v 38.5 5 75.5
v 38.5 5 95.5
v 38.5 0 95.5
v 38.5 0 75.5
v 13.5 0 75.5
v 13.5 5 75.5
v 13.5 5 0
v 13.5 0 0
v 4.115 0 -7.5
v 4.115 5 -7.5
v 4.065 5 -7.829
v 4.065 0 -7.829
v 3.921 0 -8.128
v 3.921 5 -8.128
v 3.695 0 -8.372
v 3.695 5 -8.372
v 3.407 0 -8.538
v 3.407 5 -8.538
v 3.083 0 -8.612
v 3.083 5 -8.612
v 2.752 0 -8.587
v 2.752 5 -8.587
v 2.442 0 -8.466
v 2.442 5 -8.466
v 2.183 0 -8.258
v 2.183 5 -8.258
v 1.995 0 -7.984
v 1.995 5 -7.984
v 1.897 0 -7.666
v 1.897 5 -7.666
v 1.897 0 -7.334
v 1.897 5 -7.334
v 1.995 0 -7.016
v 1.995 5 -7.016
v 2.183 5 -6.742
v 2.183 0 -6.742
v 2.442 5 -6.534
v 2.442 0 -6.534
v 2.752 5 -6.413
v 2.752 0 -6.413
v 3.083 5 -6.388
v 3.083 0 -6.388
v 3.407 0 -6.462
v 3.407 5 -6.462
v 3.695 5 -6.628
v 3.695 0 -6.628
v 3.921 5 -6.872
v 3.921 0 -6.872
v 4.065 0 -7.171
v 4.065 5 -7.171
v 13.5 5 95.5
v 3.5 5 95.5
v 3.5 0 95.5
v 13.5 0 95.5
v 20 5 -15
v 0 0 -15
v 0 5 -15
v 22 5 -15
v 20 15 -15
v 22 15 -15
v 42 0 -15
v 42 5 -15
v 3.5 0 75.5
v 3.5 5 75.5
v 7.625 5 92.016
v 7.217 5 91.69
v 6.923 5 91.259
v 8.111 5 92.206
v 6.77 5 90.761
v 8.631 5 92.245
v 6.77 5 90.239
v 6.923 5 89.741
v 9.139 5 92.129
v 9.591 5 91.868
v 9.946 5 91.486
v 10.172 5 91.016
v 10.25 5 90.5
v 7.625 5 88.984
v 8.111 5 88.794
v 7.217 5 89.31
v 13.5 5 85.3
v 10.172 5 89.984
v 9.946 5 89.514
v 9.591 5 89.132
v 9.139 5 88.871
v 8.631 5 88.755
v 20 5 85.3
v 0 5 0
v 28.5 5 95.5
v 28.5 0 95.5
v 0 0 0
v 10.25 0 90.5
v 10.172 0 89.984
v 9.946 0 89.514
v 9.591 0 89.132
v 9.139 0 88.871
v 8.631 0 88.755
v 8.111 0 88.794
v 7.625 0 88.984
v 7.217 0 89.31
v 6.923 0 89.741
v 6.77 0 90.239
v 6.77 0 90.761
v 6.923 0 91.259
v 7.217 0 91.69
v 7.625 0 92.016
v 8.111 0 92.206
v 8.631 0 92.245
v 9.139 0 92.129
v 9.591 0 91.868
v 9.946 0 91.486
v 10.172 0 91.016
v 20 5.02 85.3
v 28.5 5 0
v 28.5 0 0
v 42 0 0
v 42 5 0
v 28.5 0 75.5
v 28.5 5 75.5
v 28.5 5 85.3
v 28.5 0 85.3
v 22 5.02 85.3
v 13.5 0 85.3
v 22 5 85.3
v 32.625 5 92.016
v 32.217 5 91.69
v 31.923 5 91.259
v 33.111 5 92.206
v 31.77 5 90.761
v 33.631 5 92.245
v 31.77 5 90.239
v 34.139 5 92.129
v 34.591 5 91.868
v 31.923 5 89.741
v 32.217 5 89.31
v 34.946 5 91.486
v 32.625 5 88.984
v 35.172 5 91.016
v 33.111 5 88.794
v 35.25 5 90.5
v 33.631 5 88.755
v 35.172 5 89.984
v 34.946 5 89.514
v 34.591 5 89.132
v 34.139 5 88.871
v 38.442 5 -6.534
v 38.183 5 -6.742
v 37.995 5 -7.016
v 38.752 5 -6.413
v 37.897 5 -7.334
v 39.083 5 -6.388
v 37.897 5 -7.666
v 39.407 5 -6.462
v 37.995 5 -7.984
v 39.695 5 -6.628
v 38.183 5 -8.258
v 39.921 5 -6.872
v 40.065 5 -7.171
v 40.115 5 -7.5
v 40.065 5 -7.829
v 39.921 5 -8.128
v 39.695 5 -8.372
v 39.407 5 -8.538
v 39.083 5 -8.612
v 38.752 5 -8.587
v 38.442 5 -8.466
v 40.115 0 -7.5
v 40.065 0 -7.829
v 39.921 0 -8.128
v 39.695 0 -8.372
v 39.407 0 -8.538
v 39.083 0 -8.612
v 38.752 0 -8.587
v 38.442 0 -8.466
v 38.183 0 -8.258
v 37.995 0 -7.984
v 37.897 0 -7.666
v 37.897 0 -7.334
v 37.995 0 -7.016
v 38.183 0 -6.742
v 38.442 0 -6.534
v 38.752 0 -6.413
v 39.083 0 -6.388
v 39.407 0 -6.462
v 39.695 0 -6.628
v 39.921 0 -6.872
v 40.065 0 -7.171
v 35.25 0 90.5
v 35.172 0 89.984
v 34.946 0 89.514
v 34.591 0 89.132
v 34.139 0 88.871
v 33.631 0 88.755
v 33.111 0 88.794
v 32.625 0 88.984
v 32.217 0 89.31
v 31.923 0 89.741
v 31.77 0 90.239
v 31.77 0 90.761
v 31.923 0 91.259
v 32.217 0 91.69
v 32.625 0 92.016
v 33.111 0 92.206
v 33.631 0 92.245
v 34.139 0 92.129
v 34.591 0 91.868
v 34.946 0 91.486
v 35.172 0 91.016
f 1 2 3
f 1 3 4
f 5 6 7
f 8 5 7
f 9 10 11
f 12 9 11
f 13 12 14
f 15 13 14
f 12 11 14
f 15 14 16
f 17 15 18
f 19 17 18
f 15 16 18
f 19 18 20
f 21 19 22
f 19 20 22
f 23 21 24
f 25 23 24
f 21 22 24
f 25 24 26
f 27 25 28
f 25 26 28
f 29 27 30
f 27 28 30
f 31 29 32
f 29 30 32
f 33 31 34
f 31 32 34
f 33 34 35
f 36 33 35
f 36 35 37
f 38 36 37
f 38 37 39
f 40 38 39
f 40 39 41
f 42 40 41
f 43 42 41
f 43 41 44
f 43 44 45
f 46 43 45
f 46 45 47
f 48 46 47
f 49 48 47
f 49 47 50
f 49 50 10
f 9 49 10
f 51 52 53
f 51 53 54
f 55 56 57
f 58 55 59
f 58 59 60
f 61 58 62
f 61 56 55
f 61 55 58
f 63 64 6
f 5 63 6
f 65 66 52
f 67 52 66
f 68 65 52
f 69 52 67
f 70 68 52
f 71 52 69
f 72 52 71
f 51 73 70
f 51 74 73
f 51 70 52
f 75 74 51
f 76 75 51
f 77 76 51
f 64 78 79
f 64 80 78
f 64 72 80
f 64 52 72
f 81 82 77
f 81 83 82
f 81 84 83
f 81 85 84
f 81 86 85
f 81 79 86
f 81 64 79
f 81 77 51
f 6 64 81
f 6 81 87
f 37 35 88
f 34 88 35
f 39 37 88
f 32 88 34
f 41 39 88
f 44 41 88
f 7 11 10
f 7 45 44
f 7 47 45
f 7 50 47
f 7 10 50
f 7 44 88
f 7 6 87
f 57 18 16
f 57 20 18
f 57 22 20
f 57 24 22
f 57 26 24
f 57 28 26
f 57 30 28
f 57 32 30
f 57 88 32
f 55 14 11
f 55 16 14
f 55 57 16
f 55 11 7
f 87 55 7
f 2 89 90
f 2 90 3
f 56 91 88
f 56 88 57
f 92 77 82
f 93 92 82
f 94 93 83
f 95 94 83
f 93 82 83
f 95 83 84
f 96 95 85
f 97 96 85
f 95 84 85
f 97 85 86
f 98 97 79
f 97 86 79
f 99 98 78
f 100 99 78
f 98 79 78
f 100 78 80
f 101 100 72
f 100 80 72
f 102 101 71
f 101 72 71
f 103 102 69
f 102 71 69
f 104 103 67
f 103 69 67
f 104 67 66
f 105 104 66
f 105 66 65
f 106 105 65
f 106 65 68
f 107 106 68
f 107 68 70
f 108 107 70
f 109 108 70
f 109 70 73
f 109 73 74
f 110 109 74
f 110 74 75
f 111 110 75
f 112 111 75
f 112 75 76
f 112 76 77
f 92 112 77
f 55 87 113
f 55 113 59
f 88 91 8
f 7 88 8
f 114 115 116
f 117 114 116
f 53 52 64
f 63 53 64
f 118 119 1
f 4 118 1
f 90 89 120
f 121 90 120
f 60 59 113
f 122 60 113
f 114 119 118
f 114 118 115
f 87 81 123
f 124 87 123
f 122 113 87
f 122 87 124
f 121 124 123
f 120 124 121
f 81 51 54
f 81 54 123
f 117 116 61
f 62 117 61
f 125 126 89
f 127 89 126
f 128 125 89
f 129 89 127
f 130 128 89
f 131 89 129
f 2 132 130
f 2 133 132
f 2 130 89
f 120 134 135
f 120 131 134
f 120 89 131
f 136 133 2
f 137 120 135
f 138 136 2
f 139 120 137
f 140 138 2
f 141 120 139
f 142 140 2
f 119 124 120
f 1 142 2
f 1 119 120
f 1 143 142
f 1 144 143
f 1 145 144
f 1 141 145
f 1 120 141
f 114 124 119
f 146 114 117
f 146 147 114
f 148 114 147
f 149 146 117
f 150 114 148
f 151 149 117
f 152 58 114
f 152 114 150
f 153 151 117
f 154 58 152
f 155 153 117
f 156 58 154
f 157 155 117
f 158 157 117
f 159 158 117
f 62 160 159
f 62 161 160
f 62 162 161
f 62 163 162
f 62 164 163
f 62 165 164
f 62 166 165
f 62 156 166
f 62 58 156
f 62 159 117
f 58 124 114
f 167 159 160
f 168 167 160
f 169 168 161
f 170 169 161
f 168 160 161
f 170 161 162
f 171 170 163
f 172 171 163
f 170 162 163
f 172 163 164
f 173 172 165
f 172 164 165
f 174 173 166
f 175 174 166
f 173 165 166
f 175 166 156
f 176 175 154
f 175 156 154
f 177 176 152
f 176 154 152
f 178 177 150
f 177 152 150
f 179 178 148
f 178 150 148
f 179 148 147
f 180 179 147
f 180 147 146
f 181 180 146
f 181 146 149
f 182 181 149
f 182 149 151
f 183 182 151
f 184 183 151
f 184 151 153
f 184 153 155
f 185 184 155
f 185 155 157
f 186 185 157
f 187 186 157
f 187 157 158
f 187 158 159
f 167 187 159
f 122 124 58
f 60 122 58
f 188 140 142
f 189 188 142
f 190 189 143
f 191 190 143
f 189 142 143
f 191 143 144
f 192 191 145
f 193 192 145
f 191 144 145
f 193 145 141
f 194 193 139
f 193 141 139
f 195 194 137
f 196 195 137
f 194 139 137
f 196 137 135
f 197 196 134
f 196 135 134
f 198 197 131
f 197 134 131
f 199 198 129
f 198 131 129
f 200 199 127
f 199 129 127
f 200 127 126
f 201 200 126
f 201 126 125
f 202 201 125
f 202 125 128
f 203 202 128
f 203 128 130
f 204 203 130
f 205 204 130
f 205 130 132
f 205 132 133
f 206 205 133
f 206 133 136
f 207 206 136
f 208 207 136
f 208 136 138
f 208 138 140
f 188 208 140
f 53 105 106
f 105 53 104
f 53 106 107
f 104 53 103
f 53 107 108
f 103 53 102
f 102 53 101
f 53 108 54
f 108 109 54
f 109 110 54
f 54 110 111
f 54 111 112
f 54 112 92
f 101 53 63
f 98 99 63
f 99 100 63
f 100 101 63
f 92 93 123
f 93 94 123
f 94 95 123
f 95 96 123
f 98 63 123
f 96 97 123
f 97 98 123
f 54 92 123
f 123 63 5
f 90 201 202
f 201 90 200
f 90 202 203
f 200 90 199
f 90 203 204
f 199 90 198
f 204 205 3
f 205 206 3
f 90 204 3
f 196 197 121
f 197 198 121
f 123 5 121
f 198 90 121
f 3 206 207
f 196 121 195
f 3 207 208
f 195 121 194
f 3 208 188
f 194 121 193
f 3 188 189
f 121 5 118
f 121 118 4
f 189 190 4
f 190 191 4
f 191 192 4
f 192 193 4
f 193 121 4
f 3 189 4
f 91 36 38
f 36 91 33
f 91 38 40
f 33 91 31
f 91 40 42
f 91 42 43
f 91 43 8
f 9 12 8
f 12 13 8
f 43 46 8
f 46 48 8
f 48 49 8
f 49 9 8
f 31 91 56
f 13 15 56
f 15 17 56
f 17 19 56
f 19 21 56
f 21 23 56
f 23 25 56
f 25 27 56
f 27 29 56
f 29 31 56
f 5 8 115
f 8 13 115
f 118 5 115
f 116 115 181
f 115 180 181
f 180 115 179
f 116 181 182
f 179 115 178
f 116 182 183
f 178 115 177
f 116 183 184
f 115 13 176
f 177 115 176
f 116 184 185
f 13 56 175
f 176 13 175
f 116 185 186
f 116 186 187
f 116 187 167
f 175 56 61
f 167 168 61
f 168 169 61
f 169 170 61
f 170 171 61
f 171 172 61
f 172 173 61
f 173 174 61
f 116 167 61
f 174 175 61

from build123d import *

# Parameters (mm, degrees)
SKETCH1_W           = 42
SKETCH1_H           = 15
BOSS_EXTRUDE1_DEPTH = 5
SKETCH2_R           = 1.115
CUT_EXTRUDE1_DEPTH  = 6
SKETCH3_W           = 15
SKETCH3_H           = 75.5
BOSS_EXTRUDE2_DEPTH = 5
SKETCH4_W           = 35
SKETCH4_H           = 10
BOSS_EXTRUDE3_DEPTH = 5
SKETCH5_W           = 10
SKETCH5_H           = 10
BOSS_EXTRUDE4_DEPTH = 5
SKETCH6_R           = 1.75
CUT_EXTRUDE2_DEPTH  = 6
SKETCH7_W           = 15
SKETCH7_H           = 0.2
CUT_EXTRUDE3_DEPTH  = 6
SKETCH8_W           = 2
SKETCH8_H           = 100.3
BOSS_EXTRUDE5_DEPTH = 10
CUT_EXTRUDE4_DEPTH  = 23


with BuildPart() as part:
    # Sketch1 → Boss-Extrude1 (new body)
    with BuildSketch(Plane(origin=(0, 0, 0), x_dir=(1, 0, 0), z_dir=(0, 1, 0))):
        with Locations((21, 7.5)):
            Rectangle(SKETCH1_W, SKETCH1_H)
    extrude(amount=BOSS_EXTRUDE1_DEPTH)

    # Sketch2 → Cut-Extrude1 (cut, through all)
    with BuildSketch(Plane(origin=(0, 5, 0), x_dir=(1, 0, 0), z_dir=(0, 1, 0))):
        with Locations((3, 7.5)):
            Circle(SKETCH2_R)
        with Locations((39, 7.5)):
            Circle(SKETCH2_R)
    extrude(amount=-CUT_EXTRUDE1_DEPTH, mode=Mode.SUBTRACT)

    # Sketch3 → Boss-Extrude2 (add)
    with BuildSketch(Plane(origin=(0, 5, 0), x_dir=(1, 0, 0), z_dir=(0, 1, 0))):
        with Locations((21, -37.75)):
            Rectangle(SKETCH3_W, SKETCH3_H)
    extrude(amount=-BOSS_EXTRUDE2_DEPTH)

    # Sketch4 → Boss-Extrude3 (add)
    with BuildSketch(Plane(origin=(0, 5, 0), x_dir=(1, 0, 0), z_dir=(0, 1, 0))):
        with Locations((21, -80.5)):
            Rectangle(SKETCH4_W, SKETCH4_H)
    extrude(amount=-BOSS_EXTRUDE3_DEPTH)

    # Sketch5 → Boss-Extrude4 (add)
    with BuildSketch(Plane(origin=(0, 5, 0), x_dir=(1, 0, 0), z_dir=(0, 1, 0))):
        with Locations((8.5, -90.5)):
            Rectangle(SKETCH5_W, SKETCH5_H)
        with Locations((33.5, -90.5)):
            Rectangle(SKETCH5_W, SKETCH5_H)
    extrude(amount=-BOSS_EXTRUDE4_DEPTH)

    # Sketch6 → Cut-Extrude2 (cut, through all)
    with BuildSketch(Plane(origin=(0, 5, 0), x_dir=(1, 0, 0), z_dir=(0, 1, 0))):
        with Locations((8.5, -90.5)):
            Circle(SKETCH6_R)
        with Locations((33.5, -90.5)):
            Circle(SKETCH6_R)
    extrude(amount=-CUT_EXTRUDE2_DEPTH, mode=Mode.SUBTRACT)

    # Sketch7 → Cut-Extrude3 (cut, through all)
    with BuildSketch(Plane(origin=(0, 5, 0), x_dir=(1, 0, 0), z_dir=(0, 1, 0))):
        with Locations((21, -85.4)):
            Rectangle(SKETCH7_W, SKETCH7_H)
    extrude(amount=-CUT_EXTRUDE3_DEPTH, mode=Mode.SUBTRACT)

    # Sketch8 → Boss-Extrude5 (add)
    with BuildSketch(Plane(origin=(0, 5, 0), x_dir=(1, 0, 0), z_dir=(0, 1, 0))):
        with Locations((21, -35.15)):
            Rectangle(SKETCH8_W, SKETCH8_H)
    extrude(amount=BOSS_EXTRUDE5_DEPTH)

    # Sketch9 → Cut-Extrude4 (cut, through all)
    with BuildSketch(Plane.ZY.offset(-20)):
        Polygon((-15, 15), (85.5, 5), (85.3, 15), align=None)
    extrude(amount=-CUT_EXTRUDE4_DEPTH, mode=Mode.SUBTRACT)


solid = part.part
